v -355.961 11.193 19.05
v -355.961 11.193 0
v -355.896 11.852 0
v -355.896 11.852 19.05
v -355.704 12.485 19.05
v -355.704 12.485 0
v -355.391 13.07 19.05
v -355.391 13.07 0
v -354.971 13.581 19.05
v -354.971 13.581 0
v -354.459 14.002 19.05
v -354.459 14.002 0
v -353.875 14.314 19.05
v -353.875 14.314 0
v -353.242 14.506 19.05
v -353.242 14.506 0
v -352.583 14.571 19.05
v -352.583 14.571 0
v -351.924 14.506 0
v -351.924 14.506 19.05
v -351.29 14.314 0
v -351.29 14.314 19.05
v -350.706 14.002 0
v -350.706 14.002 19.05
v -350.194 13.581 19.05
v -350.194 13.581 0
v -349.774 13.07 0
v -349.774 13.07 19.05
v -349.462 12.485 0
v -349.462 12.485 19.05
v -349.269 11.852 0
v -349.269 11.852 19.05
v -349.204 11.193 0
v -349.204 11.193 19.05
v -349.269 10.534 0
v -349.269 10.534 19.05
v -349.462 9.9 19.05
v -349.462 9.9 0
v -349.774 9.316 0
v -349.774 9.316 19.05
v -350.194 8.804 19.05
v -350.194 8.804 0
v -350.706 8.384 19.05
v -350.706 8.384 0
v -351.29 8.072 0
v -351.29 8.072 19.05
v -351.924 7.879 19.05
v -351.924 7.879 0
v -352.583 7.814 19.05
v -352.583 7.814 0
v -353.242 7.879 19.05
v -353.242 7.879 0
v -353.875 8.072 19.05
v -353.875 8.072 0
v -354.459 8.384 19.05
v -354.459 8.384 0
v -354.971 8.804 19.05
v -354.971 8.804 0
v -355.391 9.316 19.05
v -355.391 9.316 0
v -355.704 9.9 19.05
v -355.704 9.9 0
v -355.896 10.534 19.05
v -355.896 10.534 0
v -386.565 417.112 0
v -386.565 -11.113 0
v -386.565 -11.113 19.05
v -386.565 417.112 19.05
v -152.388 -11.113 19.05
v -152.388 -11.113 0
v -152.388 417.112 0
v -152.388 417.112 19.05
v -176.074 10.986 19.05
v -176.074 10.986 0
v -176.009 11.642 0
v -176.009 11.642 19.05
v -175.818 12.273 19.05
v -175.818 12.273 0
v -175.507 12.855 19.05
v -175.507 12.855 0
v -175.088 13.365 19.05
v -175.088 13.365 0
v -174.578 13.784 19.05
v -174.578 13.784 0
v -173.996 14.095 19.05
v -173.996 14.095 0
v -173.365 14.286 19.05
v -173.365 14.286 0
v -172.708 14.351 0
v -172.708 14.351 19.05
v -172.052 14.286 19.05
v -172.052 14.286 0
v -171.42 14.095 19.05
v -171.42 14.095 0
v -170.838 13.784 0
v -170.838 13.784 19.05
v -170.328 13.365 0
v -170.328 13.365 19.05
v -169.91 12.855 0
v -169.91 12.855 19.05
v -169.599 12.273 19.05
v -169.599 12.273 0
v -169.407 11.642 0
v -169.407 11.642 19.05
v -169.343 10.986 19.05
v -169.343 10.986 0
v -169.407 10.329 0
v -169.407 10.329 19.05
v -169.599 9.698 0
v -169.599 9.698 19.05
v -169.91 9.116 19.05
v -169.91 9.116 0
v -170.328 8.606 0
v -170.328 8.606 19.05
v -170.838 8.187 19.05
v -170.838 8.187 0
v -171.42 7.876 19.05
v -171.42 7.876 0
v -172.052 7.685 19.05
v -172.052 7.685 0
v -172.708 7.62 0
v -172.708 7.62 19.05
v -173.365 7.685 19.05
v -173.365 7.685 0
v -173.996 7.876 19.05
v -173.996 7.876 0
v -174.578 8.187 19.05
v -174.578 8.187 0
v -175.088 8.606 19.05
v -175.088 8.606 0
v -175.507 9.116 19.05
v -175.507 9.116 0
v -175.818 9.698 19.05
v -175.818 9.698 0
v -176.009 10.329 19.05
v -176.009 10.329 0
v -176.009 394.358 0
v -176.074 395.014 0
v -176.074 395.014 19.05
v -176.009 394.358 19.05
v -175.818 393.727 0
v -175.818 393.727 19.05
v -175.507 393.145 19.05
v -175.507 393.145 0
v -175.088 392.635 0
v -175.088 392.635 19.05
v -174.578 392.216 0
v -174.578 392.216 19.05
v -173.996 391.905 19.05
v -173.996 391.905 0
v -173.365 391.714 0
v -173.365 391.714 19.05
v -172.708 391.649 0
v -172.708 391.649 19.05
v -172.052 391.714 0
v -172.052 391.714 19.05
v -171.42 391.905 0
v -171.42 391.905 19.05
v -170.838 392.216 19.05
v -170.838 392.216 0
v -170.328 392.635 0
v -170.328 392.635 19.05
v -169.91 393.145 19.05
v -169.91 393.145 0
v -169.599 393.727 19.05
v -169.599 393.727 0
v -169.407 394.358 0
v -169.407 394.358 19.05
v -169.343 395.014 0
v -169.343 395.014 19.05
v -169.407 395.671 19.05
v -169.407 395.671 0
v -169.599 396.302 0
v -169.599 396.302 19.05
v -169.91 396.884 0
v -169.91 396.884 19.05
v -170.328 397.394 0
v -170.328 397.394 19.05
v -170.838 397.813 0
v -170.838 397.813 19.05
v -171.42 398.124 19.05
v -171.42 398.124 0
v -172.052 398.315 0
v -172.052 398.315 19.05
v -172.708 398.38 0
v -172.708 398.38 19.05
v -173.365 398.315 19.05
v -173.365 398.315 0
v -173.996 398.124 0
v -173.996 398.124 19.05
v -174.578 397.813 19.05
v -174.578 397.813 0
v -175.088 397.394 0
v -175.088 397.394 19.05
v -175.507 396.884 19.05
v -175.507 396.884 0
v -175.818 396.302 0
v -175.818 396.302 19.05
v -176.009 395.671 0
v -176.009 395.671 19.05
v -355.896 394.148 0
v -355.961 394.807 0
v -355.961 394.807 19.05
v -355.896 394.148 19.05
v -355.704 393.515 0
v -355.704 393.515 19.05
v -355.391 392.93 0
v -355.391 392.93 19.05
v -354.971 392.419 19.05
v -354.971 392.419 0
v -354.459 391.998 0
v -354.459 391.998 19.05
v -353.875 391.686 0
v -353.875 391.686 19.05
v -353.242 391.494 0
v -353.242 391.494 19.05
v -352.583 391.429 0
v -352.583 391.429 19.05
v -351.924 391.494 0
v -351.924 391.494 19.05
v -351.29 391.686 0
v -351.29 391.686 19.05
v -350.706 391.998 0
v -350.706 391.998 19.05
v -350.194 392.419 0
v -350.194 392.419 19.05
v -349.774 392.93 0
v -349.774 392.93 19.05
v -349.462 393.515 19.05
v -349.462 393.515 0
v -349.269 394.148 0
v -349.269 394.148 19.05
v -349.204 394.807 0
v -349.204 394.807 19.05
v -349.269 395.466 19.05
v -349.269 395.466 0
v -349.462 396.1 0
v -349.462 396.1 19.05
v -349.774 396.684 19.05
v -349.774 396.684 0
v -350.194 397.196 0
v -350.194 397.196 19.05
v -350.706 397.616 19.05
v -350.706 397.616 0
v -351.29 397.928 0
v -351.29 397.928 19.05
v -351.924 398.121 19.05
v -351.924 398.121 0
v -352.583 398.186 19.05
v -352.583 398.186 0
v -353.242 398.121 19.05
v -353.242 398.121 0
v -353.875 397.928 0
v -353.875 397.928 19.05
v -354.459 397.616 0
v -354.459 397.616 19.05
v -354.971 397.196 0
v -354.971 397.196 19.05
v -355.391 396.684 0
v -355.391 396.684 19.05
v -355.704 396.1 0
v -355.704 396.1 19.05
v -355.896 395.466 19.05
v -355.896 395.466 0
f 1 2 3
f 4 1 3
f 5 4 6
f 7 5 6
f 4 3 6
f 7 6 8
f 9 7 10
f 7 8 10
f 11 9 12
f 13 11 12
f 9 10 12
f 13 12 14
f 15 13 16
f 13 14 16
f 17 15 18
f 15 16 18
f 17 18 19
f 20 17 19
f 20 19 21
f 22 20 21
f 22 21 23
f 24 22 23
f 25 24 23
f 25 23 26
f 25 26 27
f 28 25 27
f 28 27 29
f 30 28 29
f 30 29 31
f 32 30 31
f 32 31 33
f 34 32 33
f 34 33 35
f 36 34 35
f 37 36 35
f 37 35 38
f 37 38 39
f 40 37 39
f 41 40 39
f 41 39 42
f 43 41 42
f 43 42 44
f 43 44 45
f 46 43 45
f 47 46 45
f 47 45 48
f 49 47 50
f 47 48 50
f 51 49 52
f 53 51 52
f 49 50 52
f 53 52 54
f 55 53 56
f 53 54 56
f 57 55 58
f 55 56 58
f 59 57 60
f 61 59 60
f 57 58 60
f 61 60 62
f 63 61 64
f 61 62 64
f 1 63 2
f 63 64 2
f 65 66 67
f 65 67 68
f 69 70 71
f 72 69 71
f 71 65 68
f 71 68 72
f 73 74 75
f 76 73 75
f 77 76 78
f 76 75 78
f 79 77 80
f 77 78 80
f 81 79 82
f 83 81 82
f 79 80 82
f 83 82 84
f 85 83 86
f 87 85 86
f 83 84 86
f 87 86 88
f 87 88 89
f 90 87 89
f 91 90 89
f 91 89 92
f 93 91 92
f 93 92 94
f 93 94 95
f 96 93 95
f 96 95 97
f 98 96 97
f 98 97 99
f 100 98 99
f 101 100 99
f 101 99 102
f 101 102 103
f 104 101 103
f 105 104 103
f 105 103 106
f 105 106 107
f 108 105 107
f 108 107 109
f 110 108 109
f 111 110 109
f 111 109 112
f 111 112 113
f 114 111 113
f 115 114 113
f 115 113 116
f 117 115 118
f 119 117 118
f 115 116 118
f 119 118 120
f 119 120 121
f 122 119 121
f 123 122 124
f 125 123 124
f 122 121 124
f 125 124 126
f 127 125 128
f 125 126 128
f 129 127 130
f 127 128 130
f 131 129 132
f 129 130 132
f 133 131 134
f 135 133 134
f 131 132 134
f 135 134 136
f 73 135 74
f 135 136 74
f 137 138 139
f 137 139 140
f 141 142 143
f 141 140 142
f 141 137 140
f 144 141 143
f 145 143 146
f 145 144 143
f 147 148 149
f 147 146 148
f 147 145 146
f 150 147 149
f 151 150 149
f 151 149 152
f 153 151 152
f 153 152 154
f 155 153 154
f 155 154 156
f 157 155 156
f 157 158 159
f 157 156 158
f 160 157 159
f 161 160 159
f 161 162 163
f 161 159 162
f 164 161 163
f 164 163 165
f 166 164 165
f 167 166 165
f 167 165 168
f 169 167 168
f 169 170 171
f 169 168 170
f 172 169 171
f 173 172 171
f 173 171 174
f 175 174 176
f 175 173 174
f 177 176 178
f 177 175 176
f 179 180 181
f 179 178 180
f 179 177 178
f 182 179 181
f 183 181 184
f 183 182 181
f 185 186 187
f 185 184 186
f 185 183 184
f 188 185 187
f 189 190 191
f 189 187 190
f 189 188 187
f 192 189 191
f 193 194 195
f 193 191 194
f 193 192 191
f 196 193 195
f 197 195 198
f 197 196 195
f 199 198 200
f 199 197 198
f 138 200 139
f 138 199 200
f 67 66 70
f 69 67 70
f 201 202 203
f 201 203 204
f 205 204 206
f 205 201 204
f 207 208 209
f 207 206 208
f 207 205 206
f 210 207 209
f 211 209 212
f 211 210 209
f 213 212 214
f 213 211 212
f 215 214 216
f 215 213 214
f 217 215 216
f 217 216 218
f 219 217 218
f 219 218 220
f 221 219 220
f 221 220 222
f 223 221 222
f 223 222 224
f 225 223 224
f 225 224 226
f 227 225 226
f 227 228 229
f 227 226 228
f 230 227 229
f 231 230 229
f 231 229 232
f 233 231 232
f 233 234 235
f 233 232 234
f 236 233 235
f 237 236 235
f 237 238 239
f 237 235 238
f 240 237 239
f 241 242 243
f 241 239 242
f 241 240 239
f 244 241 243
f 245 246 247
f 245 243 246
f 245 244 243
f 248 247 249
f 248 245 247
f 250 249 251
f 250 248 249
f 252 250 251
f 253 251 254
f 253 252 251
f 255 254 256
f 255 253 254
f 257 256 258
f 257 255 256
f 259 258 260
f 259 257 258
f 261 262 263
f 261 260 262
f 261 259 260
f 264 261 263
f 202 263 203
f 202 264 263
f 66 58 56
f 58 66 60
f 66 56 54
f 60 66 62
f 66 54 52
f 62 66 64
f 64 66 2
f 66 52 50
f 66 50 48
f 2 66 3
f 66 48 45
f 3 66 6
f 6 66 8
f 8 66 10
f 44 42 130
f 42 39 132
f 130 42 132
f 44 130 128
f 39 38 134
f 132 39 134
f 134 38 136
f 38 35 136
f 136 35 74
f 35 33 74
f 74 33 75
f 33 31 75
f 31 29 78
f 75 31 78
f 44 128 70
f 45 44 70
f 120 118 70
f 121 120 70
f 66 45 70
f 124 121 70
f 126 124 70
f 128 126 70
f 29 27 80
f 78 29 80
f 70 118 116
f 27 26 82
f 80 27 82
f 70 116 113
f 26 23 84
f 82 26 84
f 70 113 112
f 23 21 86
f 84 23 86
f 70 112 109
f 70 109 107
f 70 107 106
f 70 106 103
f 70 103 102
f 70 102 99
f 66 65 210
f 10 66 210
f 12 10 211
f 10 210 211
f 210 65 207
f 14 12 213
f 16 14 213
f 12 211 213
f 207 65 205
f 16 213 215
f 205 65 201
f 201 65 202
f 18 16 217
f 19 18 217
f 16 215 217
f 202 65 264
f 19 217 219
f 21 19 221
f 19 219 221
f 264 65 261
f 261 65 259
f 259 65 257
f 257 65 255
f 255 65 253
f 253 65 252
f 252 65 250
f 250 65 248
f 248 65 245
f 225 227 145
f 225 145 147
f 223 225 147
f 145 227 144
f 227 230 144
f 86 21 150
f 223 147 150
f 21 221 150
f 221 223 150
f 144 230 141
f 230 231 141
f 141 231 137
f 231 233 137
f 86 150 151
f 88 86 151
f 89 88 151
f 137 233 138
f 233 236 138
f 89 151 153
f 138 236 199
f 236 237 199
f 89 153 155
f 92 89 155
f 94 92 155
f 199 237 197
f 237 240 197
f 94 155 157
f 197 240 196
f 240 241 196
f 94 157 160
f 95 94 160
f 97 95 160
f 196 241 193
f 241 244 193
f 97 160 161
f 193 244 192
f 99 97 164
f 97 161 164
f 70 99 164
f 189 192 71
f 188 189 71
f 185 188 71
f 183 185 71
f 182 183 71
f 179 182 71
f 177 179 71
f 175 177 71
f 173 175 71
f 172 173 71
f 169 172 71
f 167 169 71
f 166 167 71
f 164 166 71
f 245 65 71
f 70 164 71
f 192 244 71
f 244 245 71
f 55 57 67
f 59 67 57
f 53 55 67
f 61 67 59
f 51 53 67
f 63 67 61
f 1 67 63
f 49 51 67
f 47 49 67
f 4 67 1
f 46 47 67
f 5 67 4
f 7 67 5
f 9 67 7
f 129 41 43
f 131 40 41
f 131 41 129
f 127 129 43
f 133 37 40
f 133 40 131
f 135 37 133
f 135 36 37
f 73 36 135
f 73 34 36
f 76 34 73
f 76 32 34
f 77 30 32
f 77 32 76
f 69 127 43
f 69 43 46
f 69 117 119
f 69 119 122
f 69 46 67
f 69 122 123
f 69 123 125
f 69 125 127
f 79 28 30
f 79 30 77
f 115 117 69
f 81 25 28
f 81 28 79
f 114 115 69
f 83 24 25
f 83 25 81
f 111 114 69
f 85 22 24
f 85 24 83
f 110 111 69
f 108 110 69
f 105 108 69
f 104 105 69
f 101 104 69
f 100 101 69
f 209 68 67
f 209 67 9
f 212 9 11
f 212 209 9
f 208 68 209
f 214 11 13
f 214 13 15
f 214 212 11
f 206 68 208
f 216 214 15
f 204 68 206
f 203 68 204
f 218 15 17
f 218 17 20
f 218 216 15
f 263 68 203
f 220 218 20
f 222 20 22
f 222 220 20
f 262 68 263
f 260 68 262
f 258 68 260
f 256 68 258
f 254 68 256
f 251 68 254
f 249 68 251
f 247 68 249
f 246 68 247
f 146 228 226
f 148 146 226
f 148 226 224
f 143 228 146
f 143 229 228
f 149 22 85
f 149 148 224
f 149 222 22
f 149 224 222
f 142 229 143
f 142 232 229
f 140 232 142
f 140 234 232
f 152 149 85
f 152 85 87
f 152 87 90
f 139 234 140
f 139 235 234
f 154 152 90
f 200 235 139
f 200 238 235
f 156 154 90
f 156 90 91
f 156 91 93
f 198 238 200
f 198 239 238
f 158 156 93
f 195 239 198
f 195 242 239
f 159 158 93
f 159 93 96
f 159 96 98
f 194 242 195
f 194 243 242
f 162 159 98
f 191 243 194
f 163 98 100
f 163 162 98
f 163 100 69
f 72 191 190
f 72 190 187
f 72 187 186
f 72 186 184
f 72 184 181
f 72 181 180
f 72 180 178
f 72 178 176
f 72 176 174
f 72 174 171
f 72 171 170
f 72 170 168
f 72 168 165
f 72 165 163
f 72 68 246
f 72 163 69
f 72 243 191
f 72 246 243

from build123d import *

# Parameters (mm, degrees)
SKETCH1_W           = 234.176429215
SKETCH1_H           = 428.225
BOSS_EXTRUDE1_DEPTH = 19.05
SKETCH4_R           = 3.3655
CUT_EXTRUDE2_DEPTH  = 275.417913121
SKETCH5_R           = 3.3782
CUT_EXTRUDE3_DEPTH  = 275.68979061


with BuildPart() as part:
    # Sketch1 → Boss-Extrude1 (new body)
    with BuildSketch(Plane.XY):
        with Locations((-269.476437964, 203)):
            Rectangle(SKETCH1_W, SKETCH1_H)
    extrude(amount=BOSS_EXTRUDE1_DEPTH)

    # Sketch4 → Cut-Extrude2 (cut, through all)
    with BuildSketch(Plane(origin=(-216.206452416, 203, -1.905), x_dir=(0, -1, 0), z_dir=(0, 0, -1))):
        with Locations(Location((192.0145, -43.49822906, 0), (0, 0, 90))):
            Circle(SKETCH4_R)
    cut_extrude2 = extrude(amount=-CUT_EXTRUDE2_DEPTH, mode=Mode.SUBTRACT)

    # Sketch5 → Cut-Extrude3 (cut, through all)
    with BuildSketch(Plane(origin=(-216.206452416, 203, -5.207), x_dir=(0, -1, 0), z_dir=(0, 0, -1))):
        with Locations(Location((191.807308052, 136.376108523, 0), (0, 0, 90))):
            Circle(SKETCH5_R)
    cut_extrude3 = extrude(amount=-CUT_EXTRUDE3_DEPTH, mode=Mode.SUBTRACT)

    # Mirror1: Cut-Extrude2, Cut-Extrude3 across plane
    add(cut_extrude2.mirror(Plane.ZX.offset(203)), mode=Mode.SUBTRACT)
    add(cut_extrude3.mirror(Plane.ZX.offset(203)), mode=Mode.SUBTRACT)


solid = part.part
